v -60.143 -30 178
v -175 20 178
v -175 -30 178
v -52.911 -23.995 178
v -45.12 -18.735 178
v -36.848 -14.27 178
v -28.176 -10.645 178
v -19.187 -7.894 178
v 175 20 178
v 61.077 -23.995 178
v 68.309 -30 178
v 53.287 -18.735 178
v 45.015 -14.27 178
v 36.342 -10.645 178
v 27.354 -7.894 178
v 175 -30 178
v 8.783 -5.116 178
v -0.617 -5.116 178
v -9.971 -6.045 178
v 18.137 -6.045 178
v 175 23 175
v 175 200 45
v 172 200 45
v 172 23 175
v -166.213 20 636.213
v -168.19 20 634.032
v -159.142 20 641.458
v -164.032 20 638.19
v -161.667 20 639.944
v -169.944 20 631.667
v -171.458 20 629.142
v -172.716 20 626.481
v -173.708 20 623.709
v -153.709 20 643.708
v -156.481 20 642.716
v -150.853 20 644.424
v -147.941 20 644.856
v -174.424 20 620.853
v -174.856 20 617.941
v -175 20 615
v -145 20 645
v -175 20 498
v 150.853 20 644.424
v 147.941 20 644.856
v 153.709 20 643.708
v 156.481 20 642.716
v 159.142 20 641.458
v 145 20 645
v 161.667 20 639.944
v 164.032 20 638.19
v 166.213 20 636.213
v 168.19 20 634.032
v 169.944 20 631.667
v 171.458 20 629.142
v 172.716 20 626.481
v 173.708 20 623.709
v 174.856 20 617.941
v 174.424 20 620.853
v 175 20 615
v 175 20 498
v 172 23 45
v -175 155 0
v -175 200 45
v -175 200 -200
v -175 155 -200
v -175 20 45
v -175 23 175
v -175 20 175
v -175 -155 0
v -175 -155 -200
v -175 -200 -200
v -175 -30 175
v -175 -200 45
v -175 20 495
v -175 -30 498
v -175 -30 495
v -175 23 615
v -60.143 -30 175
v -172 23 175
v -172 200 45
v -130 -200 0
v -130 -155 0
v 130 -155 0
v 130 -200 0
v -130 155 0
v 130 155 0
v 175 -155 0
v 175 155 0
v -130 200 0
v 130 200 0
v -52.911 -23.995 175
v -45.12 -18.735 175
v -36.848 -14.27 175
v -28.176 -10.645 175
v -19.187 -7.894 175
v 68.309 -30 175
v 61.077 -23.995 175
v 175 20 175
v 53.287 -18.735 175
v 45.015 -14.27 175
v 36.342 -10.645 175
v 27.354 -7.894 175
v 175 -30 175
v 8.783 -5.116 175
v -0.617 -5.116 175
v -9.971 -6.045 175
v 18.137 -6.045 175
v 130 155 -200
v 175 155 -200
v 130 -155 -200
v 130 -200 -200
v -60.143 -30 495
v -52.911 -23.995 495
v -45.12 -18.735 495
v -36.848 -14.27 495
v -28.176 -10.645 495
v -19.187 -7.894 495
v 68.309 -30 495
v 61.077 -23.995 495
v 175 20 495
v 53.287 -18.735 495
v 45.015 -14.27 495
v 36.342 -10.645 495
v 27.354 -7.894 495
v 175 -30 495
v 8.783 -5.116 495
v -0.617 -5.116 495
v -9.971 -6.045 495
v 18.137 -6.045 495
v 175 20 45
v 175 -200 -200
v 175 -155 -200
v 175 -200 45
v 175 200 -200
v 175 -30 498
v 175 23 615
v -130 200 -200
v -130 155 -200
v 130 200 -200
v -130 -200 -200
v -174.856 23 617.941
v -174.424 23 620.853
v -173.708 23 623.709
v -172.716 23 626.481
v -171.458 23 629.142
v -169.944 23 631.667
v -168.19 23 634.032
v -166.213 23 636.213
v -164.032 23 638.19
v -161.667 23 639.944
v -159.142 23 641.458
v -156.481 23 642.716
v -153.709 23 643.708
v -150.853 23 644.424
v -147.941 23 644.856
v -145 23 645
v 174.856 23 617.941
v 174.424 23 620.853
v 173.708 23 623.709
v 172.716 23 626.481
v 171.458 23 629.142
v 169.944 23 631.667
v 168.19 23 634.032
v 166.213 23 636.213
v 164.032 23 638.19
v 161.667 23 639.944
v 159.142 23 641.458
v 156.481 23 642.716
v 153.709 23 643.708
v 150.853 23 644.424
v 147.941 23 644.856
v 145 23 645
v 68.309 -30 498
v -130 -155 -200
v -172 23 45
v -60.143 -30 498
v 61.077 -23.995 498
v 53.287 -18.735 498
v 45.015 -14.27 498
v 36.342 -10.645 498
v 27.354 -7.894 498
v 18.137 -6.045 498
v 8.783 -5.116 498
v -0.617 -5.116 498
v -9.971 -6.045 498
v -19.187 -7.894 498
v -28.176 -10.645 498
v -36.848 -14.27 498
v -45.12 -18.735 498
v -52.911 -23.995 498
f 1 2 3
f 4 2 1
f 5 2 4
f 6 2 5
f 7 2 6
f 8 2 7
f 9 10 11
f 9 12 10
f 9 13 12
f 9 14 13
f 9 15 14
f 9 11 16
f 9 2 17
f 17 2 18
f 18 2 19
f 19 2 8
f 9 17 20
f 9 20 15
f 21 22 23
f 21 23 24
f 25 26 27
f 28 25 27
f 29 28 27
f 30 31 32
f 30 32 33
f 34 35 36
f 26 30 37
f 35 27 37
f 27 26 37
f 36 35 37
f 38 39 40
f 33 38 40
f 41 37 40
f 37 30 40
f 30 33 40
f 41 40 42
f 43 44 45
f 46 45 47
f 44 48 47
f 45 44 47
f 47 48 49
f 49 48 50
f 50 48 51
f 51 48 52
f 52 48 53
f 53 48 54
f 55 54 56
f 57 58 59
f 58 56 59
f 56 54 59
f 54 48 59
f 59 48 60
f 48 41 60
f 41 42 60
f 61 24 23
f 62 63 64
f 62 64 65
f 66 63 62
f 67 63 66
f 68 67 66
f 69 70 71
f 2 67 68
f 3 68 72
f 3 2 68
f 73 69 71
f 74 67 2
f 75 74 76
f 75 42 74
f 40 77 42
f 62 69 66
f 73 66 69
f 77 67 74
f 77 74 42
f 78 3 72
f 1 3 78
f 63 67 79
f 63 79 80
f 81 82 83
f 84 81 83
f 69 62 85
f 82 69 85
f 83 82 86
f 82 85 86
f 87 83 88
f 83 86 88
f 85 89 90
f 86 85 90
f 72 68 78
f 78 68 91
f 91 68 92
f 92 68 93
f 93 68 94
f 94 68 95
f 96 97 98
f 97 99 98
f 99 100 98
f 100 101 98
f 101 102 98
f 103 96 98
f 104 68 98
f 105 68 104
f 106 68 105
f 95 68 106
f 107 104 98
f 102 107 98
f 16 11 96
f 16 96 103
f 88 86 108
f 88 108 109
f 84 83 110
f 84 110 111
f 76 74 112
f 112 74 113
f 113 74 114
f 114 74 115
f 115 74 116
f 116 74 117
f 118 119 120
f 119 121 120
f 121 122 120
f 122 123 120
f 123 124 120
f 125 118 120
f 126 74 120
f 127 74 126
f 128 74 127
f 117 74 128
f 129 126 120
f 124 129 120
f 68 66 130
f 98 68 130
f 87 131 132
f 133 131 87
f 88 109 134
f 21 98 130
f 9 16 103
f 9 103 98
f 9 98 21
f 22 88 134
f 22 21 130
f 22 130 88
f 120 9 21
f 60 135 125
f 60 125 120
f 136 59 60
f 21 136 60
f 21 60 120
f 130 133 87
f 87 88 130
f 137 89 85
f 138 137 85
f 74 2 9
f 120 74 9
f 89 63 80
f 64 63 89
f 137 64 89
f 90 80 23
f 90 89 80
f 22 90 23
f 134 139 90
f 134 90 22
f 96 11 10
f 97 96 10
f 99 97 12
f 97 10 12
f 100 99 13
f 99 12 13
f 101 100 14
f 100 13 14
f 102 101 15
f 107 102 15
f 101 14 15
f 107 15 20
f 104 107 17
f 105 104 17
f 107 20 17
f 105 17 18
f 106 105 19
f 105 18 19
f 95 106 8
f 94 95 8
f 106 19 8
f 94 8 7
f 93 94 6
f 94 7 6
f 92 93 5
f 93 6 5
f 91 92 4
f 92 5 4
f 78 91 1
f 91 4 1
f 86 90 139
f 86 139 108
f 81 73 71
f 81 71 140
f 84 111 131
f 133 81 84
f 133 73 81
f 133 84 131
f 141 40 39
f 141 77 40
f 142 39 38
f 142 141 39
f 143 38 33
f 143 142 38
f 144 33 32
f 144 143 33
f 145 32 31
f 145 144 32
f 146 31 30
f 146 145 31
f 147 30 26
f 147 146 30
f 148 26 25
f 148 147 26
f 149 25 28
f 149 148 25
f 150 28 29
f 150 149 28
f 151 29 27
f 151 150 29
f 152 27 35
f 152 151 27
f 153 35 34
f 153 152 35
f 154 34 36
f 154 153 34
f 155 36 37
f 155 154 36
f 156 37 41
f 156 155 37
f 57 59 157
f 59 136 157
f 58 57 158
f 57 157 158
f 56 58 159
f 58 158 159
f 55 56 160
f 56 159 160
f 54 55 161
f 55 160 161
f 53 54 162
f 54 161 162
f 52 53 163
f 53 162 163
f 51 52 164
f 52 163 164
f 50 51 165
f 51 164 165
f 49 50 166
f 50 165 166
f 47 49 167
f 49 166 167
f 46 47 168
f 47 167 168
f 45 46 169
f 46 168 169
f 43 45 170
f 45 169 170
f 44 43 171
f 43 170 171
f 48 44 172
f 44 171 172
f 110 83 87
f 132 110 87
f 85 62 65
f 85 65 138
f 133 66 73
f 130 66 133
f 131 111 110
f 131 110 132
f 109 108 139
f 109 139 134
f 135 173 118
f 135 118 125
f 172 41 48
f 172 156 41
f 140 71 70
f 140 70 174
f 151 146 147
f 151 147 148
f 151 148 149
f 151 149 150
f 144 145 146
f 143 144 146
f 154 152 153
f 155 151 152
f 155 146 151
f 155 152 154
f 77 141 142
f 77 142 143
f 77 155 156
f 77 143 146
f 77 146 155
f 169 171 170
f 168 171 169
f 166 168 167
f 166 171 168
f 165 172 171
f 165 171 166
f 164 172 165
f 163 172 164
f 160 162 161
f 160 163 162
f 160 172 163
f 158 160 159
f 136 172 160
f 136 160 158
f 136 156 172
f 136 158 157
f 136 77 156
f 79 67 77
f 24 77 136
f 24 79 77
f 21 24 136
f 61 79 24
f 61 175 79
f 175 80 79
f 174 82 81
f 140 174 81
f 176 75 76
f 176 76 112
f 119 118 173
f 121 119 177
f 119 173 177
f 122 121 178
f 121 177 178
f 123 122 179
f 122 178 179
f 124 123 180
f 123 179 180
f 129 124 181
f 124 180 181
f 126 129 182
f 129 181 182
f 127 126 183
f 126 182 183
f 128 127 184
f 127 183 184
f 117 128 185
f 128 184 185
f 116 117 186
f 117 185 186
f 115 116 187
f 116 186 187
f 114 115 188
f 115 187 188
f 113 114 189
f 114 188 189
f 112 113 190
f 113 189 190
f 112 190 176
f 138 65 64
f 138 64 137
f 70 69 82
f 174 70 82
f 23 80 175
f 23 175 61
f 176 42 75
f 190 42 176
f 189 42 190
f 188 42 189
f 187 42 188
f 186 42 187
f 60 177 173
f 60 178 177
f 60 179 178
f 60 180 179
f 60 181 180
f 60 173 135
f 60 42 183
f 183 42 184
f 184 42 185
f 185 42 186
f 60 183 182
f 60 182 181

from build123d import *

# Parameters (mm, degrees)
F0_W      = 350
F0_H      = 400
F1_DEPTH  = 45
F2_W      = 45
F2_H      = 45
F3_DEPTH  = 200
F4_W      = 350
F4_H      = 3
F5_DEPTH  = 600
F6_R      = 30
F8_DEPTH  = 3
F10_DEPTH = 3
F11_W     = 350
F11_H     = 3
F12_DEPTH = 50
F14_DEPTH = 350


with BuildPart() as f1:
    # F0 (on Top) → F1 (new body)
    with BuildSketch(Plane.XY):
        Rectangle(F0_W, F0_H)
    extrude(amount=F1_DEPTH)

    # F2 (on face) → F3 (join)
    with BuildSketch(Plane(origin=(0, 0, 0), x_dir=(1, 0, 0), z_dir=(0, 0, -1))):
        with Locations((-152.5, 177.5)):
            Rectangle(F2_W, F2_H)
        with Locations((152.5, 177.5)):
            Rectangle(F2_W, F2_H)
        with Locations((-152.5, -177.5)):
            Rectangle(F2_W, F2_H)
        with Locations((152.5, -177.5)):
            Rectangle(F2_W, F2_H)
    extrude(amount=F3_DEPTH)

    # F4 (on face) → F5 (join)
    with BuildSketch(Plane.XY.offset(45)):
        with Locations((0, 21.5)):
            Rectangle(F4_W, F4_H)
    extrude(amount=F5_DEPTH)

    # F6
    f6_edges = [f1.edges().sort_by_distance(p)[0] for p in [
        (-175, 21.5, 645),
        (175, 21.5, 645),
    ]]
    fillet(f6_edges, radius=F6_R)

    # F7 (on face) → F8 (join)
    with BuildSketch(Plane.YZ.offset(175)):
        Polygon((23, 45), (200, 45), (23, 175), align=None)
    extrude(amount=-F8_DEPTH)

    # F9 (on face) → F10 (join)
    with BuildSketch(Plane(origin=(-175, 0, 0), x_dir=(0, -1, 0), z_dir=(-1, 0, 0))):
        Polygon((-23, 175), (-200, 45), (-23, 45), align=None)
    extrude(amount=-F10_DEPTH)

    # F11 (on face) → F12 (join)
    with BuildSketch(Plane.XZ.offset(-20)):
        with Locations((0, 176.5)):
            Rectangle(F11_W, F11_H)
        with Locations((0, 496.5)):
            Rectangle(F11_W, F11_H)
    extrude(amount=F12_DEPTH)

    # F13 (on face) → F14 (cut)
    with BuildSketch(Plane.XY.offset(498)):
        with BuildLine():
            ThreePointArc((-60.1428805791, -30), (-34.1496519515, -186.9669059898), (99.0832823142, -100))
            ThreePointArc((99.0832823142, -100), (91.050188304, -61.7670657343), (68.3094452076, -30))
            Line((68.3094452076, -30), (-60.1428805791, -30))
        make_face()
        with BuildLine():
            Line((-60.1428805791, -30), (68.3094452076, -30))
            ThreePointArc((68.3094452076, -30), (4.0832823142, -5), (-60.1428805791, -30))
        make_face()
    extrude(amount=-F14_DEPTH, mode=Mode.SUBTRACT)


solid = f1.part
